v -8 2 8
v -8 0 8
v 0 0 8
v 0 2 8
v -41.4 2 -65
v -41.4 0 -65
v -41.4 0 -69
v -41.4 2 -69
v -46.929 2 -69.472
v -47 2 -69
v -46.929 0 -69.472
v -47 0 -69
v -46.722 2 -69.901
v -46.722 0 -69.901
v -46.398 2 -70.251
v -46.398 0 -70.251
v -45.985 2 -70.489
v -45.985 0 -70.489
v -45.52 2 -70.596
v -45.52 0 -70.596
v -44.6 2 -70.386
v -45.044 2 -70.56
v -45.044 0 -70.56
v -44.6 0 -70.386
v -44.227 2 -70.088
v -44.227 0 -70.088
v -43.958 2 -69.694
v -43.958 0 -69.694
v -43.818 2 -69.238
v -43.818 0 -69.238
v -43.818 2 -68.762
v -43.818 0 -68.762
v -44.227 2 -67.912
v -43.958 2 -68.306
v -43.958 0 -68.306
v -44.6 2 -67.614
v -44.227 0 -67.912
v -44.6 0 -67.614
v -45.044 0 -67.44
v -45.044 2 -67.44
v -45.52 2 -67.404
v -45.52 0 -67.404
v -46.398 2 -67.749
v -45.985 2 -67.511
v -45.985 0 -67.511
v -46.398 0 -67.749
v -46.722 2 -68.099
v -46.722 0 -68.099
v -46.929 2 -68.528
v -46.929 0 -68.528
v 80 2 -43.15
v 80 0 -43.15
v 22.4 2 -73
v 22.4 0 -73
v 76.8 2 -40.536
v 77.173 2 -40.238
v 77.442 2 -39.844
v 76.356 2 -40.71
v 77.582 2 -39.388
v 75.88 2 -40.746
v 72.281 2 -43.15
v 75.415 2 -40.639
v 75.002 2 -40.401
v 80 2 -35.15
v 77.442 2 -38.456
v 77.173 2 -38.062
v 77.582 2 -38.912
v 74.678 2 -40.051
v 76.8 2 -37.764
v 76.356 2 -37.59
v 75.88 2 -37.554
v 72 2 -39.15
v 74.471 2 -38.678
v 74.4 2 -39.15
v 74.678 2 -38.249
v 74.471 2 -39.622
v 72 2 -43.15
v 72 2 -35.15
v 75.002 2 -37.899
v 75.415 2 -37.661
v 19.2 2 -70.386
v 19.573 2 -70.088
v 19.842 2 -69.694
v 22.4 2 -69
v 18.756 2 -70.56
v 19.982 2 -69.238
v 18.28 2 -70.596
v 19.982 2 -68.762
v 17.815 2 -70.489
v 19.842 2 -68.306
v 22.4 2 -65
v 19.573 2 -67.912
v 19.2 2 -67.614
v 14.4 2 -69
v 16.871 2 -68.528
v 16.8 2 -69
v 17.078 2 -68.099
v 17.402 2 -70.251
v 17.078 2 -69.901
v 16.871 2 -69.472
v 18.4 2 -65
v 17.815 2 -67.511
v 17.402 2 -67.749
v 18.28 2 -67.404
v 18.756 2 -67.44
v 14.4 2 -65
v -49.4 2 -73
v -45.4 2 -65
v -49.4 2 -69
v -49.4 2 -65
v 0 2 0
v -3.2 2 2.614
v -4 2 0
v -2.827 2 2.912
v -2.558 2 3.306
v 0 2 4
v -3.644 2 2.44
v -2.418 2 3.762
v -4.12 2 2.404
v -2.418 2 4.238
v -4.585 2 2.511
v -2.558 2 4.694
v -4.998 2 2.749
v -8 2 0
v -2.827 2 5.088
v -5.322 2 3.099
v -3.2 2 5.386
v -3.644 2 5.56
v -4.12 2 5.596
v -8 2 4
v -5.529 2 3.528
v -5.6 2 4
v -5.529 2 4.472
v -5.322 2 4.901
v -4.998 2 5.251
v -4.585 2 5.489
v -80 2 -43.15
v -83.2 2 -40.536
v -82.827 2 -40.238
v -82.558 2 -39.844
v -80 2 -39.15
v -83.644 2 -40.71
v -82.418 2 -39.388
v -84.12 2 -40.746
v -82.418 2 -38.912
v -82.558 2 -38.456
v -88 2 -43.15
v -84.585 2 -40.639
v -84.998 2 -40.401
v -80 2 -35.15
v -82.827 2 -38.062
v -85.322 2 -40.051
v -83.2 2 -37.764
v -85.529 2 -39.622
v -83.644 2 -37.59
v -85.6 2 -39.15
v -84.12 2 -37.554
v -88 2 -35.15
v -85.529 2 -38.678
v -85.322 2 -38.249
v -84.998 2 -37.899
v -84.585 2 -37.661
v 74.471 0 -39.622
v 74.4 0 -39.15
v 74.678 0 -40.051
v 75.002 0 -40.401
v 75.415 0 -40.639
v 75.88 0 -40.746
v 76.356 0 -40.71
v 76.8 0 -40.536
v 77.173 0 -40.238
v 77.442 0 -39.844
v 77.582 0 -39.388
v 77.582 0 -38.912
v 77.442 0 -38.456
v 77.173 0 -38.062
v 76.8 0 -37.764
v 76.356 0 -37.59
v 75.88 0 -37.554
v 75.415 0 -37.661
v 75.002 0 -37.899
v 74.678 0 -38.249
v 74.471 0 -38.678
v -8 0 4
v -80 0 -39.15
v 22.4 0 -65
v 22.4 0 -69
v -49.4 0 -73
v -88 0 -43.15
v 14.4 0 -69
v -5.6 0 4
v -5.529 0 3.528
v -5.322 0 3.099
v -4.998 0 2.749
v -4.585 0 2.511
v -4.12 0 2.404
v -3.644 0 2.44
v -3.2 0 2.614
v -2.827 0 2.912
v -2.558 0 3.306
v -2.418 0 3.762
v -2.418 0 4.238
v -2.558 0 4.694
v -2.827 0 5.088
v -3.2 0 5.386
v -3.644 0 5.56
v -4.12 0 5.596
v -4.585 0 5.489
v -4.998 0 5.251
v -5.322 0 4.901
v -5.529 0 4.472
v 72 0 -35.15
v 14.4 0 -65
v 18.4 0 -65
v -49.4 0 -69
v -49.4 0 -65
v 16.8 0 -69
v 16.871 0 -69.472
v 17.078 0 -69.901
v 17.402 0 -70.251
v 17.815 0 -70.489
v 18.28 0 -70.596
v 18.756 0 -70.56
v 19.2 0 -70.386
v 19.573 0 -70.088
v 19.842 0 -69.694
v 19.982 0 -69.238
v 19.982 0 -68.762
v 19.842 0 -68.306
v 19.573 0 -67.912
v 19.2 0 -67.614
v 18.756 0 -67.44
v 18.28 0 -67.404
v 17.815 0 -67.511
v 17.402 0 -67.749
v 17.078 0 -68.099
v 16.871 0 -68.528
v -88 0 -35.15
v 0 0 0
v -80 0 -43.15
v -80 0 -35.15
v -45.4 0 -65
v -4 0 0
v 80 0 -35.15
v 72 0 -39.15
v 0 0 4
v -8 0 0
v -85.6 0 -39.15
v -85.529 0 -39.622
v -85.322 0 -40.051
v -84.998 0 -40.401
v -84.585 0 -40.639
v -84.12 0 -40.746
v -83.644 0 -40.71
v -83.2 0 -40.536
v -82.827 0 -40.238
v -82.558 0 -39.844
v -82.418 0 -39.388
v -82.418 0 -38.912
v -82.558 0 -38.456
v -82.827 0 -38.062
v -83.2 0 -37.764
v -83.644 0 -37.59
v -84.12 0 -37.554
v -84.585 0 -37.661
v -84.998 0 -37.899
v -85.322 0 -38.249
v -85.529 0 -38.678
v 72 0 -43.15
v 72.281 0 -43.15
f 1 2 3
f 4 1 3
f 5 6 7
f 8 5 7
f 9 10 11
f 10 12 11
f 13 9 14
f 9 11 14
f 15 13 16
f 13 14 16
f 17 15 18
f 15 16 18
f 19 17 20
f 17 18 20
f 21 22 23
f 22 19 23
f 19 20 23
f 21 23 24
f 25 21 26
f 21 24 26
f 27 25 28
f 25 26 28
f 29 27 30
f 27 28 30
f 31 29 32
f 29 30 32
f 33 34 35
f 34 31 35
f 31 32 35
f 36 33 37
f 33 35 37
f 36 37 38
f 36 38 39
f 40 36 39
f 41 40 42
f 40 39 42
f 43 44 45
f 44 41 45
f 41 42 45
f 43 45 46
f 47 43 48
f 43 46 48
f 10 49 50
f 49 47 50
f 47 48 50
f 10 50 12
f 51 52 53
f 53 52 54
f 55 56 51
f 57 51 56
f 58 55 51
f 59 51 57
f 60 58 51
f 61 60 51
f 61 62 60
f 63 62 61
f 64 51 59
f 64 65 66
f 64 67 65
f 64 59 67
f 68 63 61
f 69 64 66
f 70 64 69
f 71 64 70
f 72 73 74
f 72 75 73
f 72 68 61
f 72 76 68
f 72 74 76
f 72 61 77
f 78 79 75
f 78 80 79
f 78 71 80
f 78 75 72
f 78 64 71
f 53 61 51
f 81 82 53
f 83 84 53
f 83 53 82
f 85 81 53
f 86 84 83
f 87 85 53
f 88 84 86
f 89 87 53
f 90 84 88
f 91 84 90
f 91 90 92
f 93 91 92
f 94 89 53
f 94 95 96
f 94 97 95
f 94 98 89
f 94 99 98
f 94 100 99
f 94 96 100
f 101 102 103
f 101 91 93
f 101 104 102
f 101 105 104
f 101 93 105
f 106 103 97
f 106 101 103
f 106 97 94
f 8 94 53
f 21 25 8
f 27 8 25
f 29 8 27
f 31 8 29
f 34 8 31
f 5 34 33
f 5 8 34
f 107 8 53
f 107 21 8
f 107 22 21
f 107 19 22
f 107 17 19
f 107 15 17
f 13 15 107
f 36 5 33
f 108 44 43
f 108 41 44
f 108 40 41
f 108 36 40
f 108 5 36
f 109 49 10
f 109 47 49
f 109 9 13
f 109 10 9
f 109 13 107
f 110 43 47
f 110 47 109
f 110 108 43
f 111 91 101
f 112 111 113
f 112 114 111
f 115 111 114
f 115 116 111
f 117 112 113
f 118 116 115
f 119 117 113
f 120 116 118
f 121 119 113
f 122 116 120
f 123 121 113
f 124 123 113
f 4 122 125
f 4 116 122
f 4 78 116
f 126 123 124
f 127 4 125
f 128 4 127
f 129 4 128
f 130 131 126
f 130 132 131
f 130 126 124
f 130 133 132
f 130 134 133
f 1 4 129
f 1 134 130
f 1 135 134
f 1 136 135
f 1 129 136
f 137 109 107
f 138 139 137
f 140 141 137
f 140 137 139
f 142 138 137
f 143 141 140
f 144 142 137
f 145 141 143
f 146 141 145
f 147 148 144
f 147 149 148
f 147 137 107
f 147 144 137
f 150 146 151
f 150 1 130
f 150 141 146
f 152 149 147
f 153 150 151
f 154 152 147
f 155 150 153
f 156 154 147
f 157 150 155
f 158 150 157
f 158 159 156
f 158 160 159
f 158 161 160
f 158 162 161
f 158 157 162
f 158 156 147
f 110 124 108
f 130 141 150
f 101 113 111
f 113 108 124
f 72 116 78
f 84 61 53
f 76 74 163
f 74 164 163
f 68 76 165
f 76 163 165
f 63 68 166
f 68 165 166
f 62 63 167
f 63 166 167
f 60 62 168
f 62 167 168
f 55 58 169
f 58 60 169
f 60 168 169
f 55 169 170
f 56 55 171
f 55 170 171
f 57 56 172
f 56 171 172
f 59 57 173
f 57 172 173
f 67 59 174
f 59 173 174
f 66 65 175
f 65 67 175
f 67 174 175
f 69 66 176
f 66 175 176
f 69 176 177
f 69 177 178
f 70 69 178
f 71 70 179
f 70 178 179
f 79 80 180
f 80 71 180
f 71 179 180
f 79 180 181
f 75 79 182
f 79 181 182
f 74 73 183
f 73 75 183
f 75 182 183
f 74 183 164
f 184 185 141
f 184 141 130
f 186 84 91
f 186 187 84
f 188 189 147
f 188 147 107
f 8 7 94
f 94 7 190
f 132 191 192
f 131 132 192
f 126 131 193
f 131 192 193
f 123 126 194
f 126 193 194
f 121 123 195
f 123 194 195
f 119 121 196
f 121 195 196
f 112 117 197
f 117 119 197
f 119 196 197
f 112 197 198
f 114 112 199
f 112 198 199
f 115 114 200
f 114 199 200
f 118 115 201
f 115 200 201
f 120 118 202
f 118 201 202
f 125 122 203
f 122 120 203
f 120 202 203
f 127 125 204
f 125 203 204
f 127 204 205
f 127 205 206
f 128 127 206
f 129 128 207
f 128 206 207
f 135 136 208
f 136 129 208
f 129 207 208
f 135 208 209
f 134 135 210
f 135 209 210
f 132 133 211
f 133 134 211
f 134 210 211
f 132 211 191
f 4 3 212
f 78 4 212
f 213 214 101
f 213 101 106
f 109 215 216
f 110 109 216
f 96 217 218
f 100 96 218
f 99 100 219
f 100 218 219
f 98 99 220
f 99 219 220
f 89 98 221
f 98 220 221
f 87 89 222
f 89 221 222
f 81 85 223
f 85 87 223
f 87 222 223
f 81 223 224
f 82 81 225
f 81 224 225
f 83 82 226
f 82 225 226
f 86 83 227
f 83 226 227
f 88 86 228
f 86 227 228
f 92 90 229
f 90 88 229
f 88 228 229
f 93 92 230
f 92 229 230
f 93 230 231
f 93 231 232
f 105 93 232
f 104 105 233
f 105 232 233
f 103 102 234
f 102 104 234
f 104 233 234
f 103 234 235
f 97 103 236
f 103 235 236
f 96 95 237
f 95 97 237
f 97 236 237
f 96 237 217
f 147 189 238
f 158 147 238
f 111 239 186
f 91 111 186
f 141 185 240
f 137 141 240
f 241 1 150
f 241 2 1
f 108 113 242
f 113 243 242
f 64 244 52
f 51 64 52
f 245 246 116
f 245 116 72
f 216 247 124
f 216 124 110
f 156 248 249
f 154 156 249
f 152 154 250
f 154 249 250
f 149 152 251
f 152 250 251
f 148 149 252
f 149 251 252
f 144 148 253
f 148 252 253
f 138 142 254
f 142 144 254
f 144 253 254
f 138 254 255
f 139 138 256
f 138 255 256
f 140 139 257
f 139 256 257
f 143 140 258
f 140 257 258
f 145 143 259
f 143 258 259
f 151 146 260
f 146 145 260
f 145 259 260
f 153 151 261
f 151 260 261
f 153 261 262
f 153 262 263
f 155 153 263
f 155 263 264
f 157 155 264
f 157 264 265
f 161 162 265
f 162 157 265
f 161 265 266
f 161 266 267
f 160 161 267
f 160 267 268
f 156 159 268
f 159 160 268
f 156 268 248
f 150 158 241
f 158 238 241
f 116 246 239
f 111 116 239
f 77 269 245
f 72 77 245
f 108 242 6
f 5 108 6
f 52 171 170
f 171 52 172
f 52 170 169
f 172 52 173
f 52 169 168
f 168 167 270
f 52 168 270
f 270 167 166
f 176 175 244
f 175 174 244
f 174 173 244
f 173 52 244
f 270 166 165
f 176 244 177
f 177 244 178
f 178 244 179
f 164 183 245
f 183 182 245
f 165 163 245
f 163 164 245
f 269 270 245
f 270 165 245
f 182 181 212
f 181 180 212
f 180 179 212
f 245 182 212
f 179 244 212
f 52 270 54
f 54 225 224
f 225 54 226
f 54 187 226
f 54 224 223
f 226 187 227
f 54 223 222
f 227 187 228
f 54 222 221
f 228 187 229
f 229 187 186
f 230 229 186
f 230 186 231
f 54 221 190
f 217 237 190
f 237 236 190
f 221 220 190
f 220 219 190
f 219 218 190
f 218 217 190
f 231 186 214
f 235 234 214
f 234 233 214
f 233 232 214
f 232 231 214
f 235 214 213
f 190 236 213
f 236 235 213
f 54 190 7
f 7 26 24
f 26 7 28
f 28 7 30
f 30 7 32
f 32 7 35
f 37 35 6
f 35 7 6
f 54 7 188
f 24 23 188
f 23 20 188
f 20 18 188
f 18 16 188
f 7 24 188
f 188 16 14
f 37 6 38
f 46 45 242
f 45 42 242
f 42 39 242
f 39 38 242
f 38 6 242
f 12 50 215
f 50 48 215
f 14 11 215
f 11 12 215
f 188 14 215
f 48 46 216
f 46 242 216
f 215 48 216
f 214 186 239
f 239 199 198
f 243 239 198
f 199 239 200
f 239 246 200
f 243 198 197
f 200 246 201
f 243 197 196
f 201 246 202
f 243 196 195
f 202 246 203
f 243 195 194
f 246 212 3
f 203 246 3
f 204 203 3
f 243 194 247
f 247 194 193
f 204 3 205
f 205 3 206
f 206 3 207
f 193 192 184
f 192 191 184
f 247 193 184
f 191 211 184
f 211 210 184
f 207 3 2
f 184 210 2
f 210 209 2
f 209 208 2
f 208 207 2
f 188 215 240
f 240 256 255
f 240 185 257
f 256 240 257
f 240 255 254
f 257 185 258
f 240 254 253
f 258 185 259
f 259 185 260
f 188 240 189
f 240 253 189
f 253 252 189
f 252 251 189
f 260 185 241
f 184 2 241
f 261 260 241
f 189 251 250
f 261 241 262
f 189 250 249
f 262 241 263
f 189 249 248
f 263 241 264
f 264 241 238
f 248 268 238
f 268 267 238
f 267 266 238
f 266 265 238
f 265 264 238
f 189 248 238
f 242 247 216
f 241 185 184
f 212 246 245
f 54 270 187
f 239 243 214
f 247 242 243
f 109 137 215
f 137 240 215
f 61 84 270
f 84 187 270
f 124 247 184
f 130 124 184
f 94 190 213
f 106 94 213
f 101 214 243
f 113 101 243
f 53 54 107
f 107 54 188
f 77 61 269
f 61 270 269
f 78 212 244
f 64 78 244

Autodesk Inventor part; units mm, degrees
ref_plane "YZ Plane" through (0, 0, 0) normal (1, 0, 0) x (0, 1, 0)
ref_plane "XZ Plane" through (0, 0, 0) normal (0, 1, 0) x (-1, 0, 0)
ref_plane "XY Plane" through (0, 0, 0) normal (0, 0, 1) x (1, 0, 0)
sketch "Sketch1" plane through (0, 0, 0) normal (0, 1, 0) x (-1, 0, 0)
  line L0 (8, 0) -> (8, 8) projected
  line L1 (8, 8) -> (0, 8)
  line L2 (0, 8) -> (0, 0)
  line L3 (0, 0) -> (8, 0)
  line L4 (8, 0) -> (8, 8)
  line L5 (49.4, -65) -> (41.4, -65) projected
  line L6 (49.4, -65) -> (41.4, -65)
  line L7 (41.4, -65) -> (41.4, -73)
  line L8 (41.4, -73) -> (49.4, -73)
  line L9 (49.4, -73) -> (49.4, -65)
  line L10 (80, -35.15) -> (80, -43.15) projected
  line L11 (88, -35.15) -> (80, -35.15)
  line L12 (80, -35.15) -> (80, -43.15)
  line L13 (80, -43.15) -> (88, -43.15)
  line L14 (88, -43.15) -> (88, -35.15)
  line L15 (-22.4, -65) -> (-14.4, -65) projected
  line L16 (-22.4, -73) -> (-22.4, -65) projected
  line L17 (-14.4, -65) -> (-22.4, -65)
  line L18 (-22.4, -65) -> (-22.4, -73)
  line L19 (-22.4, -73) -> (-14.4, -73)
  line L20 (-14.4, -73) -> (-14.4, -65)
  line L21 (-72, -43.15) -> (-72, -35.15) projected
  line L22 (-80, -43.15) -> (-72, -43.15) projected
  line L23 (-72, -35.15) -> (-80, -35.15)
  line L24 (-80, -35.15) -> (-80, -43.15)
  line L25 (-80, -43.15) -> (-72, -43.15)
  line L26 (-72, -43.15) -> (-72, -35.15)
  circle A0 centre (-76, -39.15) radius 1.6
  circle A1 centre (-18.4, -69) radius 1.6
  circle A2 centre (45.4, -69) radius 1.6
  circle A3 centre (84, -39.15) radius 1.6
  circle A4 centre (4, 4) radius 1.6
  line L27 (0, 0) -> (8, 0) projected
  line L28 (41.4, -65) -> (41.4, -73) projected
  line L29 (41.4, -73) -> (-14.4, -73)
  line L30 (-80, -43.15) -> (-22.4, -73)
  line L31 (88, -43.15) -> (49.4, -73)
  line L32 (0, 8) -> (0, 0) projected
  line L33 (0, 8) -> (-72, -35.15)
  line L34 (8, 8) -> (80, -35.15)
  line L35 (80, -39.15) -> (8, 4)
  line L36 (0, 4) -> (-72, -39.15)
  line L37 (-22.4, -69) -> (-72.2814, -43.15)
  line L38 (80, -43.15) -> (49.4, -69)
  line L39 (49.4, -73) -> (49.4, -65) projected
  line L40 (41.4, -69) -> (-14.4, -69)
  line L41 (-14.4, -65) -> (-14.4, -73) projected
  line L42 (4, 0) -> (45.4, -65)
  line L43 (8, 0) -> (49.4, -65)
  line L44 (0, 0) -> (-22.4, -65)
  line L45 (-18.4, -65) -> (4, 0)
  point P0 (-14.4, -69)
  dimension "d0" = 3.2
extrude "Extrusion1" add sketch "Sketch1" along normal blind 2 contours L3 L2 L1 L0 | L43 L5 L42 L3 | L0 L34 L10 L35 | L45 L15 L44 L3 | L9 L8 L7 L5 | L10 L11 L14 L13 | L15 L20 L19 L16 | L38 L13 L31 L9 | L2 L36 L21 L33 | L21 L22 L24 L23 | L16 L30 L22 L37 | L7 L29 L20 L40
properties part number "ScrewHoleGuide"
